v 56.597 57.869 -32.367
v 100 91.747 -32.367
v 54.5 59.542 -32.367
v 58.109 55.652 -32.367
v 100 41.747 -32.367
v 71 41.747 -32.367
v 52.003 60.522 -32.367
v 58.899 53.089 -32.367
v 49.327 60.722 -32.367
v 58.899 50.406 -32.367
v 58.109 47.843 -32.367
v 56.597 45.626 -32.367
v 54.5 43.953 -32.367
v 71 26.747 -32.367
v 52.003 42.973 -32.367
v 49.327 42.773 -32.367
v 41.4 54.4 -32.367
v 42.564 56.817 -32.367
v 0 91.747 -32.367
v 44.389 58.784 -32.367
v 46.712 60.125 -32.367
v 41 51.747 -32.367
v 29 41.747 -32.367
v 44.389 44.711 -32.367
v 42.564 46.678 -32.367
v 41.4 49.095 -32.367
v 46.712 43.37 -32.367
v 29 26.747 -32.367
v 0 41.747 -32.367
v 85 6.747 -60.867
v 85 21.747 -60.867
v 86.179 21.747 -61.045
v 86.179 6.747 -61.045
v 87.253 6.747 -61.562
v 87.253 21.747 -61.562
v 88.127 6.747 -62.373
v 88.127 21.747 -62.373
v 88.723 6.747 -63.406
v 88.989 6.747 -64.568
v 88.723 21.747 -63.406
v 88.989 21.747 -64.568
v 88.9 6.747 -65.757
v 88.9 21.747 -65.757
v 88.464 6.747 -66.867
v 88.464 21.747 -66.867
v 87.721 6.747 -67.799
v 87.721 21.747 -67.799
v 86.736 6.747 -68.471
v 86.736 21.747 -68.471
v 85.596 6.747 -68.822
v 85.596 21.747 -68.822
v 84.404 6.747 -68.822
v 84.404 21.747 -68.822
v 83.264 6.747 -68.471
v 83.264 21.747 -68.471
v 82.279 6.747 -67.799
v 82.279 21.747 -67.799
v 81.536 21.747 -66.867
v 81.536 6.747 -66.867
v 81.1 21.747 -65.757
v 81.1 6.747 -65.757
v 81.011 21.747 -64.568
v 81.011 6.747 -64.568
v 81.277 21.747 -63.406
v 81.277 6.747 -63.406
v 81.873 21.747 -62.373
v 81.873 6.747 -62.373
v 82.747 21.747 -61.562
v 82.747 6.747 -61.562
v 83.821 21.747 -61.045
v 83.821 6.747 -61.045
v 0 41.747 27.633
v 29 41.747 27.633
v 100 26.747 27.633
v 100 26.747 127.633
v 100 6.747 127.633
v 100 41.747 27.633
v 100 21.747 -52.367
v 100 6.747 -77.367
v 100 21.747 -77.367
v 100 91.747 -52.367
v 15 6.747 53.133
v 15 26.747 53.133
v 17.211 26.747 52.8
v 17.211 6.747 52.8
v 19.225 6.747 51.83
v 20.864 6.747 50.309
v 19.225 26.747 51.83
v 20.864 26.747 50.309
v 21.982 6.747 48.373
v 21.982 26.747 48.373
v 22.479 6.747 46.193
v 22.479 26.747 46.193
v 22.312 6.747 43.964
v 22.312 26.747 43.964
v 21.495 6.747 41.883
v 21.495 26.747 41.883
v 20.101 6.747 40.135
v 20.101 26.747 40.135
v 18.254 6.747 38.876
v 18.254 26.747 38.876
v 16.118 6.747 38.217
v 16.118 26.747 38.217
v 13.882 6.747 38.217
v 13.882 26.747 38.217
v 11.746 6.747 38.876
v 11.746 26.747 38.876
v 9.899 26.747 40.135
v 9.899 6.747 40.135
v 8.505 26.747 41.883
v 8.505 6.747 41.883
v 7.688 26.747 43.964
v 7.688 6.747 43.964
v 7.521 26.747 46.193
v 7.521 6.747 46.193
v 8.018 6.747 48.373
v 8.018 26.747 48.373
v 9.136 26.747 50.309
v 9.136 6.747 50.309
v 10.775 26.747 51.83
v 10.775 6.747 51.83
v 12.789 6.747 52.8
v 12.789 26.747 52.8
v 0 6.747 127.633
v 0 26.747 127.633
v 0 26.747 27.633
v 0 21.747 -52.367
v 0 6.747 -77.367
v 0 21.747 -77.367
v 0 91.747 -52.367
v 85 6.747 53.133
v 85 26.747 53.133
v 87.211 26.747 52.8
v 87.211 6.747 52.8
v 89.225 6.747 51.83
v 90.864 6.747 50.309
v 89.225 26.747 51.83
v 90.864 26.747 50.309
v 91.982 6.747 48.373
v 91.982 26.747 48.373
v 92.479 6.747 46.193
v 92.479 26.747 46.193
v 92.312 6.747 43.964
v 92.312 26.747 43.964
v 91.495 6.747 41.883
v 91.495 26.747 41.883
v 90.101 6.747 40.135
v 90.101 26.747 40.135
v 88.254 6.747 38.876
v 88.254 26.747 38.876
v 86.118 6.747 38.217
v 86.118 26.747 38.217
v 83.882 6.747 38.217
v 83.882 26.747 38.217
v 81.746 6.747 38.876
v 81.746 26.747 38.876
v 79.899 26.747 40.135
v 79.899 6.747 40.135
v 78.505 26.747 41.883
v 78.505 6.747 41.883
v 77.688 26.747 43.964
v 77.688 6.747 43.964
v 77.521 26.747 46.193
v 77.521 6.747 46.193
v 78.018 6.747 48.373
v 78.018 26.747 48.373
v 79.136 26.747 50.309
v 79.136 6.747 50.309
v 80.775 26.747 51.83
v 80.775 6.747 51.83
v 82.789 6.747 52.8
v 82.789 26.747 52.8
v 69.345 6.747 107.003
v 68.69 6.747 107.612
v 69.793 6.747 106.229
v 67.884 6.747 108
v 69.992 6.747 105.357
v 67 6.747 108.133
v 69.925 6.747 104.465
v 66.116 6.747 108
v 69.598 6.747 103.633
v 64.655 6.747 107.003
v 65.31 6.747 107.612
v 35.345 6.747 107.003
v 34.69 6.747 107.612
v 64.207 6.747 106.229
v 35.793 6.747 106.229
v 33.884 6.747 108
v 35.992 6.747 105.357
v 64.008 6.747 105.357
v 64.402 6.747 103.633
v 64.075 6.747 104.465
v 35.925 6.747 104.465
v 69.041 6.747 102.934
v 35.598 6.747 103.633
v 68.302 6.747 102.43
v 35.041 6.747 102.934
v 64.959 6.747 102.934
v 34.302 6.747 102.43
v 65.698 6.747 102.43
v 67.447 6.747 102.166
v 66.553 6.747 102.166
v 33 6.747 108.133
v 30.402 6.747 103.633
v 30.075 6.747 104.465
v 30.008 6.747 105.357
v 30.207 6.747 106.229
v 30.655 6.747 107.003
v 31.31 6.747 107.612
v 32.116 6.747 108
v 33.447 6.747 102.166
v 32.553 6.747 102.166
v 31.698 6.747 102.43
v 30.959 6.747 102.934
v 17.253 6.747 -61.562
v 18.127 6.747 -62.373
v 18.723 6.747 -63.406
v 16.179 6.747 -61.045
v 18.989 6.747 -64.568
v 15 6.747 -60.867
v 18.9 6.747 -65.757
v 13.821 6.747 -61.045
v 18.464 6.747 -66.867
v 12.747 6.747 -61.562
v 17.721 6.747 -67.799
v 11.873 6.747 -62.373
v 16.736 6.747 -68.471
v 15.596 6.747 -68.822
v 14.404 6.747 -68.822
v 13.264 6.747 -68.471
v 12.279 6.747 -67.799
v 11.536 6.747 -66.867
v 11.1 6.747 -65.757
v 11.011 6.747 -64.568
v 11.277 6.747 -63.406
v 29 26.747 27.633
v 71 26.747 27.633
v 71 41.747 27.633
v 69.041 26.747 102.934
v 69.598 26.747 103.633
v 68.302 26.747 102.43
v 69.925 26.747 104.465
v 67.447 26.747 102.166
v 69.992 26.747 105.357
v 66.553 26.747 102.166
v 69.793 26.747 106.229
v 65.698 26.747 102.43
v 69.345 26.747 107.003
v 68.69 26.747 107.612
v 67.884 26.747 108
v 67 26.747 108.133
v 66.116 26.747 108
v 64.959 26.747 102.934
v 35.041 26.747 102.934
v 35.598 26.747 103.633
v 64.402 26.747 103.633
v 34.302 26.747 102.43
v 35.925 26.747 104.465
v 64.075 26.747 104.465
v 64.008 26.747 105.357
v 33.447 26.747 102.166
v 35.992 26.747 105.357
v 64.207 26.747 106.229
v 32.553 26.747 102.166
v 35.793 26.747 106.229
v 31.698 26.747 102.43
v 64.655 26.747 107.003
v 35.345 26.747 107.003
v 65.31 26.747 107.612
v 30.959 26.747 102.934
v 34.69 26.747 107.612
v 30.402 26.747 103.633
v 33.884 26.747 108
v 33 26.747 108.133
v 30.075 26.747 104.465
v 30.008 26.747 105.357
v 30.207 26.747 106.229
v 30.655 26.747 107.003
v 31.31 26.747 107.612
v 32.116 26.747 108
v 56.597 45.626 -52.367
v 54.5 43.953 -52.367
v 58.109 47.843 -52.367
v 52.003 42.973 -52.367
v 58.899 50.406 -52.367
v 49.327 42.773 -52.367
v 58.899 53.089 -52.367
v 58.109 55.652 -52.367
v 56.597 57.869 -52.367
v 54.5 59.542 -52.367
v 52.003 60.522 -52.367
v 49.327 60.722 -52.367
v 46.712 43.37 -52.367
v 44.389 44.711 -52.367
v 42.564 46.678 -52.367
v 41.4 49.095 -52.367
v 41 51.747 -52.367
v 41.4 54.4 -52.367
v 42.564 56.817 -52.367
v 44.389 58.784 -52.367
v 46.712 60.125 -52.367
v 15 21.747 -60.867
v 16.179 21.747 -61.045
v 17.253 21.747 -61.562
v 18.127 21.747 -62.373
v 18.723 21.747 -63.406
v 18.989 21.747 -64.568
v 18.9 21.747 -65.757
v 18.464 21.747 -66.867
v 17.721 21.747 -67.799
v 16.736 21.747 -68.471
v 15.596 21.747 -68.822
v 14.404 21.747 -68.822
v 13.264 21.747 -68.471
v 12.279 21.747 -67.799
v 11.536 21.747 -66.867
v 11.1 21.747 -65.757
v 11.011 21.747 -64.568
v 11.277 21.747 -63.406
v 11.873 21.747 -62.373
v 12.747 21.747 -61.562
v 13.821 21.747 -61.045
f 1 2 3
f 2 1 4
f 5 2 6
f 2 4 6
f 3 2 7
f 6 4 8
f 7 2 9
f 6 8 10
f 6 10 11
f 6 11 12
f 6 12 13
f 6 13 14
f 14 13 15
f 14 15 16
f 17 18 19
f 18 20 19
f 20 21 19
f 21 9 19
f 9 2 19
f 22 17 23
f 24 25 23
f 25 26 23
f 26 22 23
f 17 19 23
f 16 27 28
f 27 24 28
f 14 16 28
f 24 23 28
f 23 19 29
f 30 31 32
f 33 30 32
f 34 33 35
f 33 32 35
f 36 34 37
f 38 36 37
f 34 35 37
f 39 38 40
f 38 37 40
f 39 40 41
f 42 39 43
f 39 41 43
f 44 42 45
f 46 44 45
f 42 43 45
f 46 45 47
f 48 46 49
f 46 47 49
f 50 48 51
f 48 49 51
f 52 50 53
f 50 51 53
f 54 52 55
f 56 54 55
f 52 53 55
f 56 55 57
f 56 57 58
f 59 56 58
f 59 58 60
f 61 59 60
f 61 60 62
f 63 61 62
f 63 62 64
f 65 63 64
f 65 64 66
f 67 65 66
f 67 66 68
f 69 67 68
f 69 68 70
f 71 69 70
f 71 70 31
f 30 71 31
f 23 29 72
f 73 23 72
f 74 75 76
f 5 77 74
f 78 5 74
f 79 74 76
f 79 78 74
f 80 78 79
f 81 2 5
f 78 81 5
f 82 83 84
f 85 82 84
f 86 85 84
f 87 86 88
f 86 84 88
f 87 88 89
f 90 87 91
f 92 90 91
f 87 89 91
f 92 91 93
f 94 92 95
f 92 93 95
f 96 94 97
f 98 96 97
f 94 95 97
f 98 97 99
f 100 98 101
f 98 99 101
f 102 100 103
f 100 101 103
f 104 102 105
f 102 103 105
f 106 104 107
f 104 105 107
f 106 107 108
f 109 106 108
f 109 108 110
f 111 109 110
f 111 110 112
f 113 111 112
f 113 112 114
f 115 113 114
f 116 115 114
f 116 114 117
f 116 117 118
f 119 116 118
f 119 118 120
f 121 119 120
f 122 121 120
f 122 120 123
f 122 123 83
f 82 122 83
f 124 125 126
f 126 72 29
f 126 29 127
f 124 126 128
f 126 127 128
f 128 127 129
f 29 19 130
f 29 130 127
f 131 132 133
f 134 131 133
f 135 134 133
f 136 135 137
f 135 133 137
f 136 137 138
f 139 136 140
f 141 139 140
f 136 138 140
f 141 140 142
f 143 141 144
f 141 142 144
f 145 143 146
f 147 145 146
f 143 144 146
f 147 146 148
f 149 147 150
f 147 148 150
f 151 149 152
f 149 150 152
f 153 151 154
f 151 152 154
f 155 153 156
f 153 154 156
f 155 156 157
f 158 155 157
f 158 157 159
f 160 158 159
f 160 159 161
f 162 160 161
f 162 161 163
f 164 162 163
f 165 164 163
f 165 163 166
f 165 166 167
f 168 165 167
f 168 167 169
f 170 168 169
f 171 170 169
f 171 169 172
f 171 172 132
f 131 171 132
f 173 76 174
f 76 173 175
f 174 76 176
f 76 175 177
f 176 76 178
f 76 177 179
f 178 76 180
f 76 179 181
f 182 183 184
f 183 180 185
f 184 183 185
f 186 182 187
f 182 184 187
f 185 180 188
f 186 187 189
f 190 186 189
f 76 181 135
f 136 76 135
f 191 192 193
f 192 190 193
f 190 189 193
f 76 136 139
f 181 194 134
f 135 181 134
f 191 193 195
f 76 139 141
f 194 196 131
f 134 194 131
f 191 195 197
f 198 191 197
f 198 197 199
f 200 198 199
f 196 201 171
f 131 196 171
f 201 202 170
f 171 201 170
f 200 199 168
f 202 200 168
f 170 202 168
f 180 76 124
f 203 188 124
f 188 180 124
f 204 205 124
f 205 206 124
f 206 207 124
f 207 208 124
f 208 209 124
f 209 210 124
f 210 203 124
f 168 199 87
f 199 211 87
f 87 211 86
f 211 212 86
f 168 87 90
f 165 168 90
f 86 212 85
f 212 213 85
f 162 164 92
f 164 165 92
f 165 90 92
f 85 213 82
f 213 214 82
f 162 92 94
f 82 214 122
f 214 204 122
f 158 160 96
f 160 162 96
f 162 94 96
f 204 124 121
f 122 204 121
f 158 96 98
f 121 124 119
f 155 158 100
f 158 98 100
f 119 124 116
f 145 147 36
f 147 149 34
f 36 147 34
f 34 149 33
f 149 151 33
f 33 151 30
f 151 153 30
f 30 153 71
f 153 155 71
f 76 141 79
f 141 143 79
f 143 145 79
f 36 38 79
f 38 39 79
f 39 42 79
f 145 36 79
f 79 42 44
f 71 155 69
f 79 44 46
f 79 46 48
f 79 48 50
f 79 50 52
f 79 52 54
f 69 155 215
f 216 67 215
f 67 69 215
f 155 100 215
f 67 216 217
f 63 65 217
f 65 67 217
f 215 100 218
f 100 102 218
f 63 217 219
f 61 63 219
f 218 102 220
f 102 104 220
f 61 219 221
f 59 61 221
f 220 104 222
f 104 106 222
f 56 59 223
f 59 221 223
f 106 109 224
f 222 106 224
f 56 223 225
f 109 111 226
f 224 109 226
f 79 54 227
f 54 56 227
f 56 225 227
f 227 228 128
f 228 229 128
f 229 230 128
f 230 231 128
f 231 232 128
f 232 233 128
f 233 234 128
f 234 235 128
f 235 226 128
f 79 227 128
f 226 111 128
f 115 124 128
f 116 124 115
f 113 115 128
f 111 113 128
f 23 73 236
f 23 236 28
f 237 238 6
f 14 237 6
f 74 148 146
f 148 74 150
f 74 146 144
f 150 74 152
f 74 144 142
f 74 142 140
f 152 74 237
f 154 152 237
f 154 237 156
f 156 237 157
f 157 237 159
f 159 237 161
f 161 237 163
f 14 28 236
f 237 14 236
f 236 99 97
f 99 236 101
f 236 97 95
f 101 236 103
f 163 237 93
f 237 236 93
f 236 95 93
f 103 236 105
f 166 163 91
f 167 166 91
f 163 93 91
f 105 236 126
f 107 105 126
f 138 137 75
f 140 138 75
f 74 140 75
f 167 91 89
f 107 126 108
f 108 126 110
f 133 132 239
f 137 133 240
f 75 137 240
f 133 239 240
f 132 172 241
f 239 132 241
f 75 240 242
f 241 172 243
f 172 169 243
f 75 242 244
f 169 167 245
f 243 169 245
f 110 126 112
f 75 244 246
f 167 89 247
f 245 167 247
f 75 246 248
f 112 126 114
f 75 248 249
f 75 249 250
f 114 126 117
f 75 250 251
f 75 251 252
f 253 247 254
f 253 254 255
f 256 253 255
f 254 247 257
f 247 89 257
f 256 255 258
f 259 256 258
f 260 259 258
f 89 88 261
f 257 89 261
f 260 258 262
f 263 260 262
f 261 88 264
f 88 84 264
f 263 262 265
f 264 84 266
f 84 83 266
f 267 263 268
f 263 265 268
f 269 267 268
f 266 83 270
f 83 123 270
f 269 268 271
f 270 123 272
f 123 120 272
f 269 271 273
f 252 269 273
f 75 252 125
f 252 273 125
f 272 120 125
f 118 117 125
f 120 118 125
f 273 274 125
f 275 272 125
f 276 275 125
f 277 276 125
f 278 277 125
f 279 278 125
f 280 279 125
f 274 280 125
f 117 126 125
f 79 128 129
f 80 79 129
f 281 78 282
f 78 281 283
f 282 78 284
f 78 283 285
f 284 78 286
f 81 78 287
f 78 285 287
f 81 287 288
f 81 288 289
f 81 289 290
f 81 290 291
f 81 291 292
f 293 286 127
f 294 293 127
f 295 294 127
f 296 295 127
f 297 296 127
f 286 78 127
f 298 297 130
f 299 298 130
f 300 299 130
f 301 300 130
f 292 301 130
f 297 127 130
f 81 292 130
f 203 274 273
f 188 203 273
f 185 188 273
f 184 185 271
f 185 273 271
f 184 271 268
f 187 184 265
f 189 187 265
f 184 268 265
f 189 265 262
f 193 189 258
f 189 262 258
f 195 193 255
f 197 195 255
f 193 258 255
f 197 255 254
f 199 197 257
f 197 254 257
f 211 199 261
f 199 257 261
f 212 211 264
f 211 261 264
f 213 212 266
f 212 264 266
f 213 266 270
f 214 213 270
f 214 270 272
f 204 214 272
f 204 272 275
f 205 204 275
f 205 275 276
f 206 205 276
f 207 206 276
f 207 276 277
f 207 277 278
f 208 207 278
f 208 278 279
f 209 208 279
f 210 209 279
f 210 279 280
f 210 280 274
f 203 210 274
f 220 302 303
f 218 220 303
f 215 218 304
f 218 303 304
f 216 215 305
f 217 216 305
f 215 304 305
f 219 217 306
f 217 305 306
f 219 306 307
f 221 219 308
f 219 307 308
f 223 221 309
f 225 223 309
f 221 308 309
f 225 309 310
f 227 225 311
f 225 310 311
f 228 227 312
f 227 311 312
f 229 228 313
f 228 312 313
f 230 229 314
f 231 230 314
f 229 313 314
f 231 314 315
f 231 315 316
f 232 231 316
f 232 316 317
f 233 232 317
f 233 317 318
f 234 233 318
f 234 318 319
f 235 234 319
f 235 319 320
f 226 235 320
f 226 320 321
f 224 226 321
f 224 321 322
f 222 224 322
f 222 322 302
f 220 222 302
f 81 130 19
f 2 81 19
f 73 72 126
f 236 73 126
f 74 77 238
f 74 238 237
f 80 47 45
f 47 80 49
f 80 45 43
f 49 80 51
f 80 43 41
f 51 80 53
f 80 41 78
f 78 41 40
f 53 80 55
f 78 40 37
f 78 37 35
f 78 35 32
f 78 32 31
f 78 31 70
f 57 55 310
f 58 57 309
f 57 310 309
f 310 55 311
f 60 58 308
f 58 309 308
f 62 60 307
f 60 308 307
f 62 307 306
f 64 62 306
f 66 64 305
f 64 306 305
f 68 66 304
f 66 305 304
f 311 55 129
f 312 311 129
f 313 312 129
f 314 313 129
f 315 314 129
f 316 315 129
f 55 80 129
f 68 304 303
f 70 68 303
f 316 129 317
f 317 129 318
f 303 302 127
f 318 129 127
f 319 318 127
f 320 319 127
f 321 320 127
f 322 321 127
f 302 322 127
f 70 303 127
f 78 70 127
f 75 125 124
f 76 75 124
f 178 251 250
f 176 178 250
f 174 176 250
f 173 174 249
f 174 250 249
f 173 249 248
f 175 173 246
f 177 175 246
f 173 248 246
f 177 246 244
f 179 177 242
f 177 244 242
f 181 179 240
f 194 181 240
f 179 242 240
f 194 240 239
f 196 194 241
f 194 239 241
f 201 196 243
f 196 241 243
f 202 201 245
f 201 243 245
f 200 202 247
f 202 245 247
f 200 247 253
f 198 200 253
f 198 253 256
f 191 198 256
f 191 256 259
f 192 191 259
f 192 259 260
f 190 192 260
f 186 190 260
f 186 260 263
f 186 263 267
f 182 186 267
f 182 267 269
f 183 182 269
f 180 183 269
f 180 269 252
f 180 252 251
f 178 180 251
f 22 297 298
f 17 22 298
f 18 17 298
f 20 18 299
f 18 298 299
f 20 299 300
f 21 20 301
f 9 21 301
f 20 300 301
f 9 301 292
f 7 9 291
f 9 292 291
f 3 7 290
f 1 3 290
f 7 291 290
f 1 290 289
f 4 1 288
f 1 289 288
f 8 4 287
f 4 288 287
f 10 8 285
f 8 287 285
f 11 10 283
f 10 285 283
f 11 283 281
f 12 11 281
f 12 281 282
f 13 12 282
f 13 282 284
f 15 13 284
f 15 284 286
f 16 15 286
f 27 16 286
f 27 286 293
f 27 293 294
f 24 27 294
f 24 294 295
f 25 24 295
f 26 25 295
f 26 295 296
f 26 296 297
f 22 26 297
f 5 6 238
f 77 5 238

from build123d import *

# Parameters (mm, degrees)
Y_KSEKLIK_EKSTR_ZYON1_DEPTH = 100
IZIM2_W                     = 42
IZIM2_H                     = 60
KES_EKSTR_ZYON1_DEPTH       = 15
IZIM3_R                     = 4
IZIM3_R_2                   = 3
KES_EKSTR_ZYON2_DEPTH       = 175.685863047
IZIM4_R                     = 7.5
KES_EKSTR_ZYON5_DEPTH       = 175.685863047
IZIM5_R                     = 9
KES_EKSTR_ZYON6_DEPTH       = 226.427594277


with BuildPart() as part:
    # Çizim1 → Yükseklik-Ekstrüzyon1 (new body)
    with BuildSketch(Plane(origin=(0, 0, 0), x_dir=(0, 0, -1), z_dir=(1, 0, 0))):
        Polygon((-127.632874873, 26.747480954), (-127.632874873, 6.747480954), (77.367125127, 6.747480954), (77.367125127, 21.747480954), (52.367125127, 21.747480954), (52.367125127, 91.747480954), (32.367125127, 91.747480954), (32.367125127, 41.747480954), (-27.632874873, 41.747480954), (-27.632874873, 26.747480954), align=None)
    extrude(amount=Y_KSEKLIK_EKSTR_ZYON1_DEPTH)

    # Çizim2 → Kes-Ekstrüzyon1 (cut)
    with BuildSketch(Plane(origin=(0, 41.747480954, 0), x_dir=(1, 0, 0), z_dir=(0, 1, 0))):
        with Locations((50, 2.367125127)):
            Rectangle(IZIM2_W, IZIM2_H)
    extrude(amount=-KES_EKSTR_ZYON1_DEPTH, mode=Mode.SUBTRACT)

    # Çizim3 → Kes-Ekstrüzyon2 (cut, through all)
    with BuildSketch(Plane(origin=(0, 26.747480954, 0), x_dir=(1, 0, 0), z_dir=(0, 1, 0))):
        with Locations(Location((15, 64.867125127, 0), (0, 0, 270))):
            Circle(IZIM3_R)
        with Locations(Location((85, 64.867125127, 0), (0, 0, 270))):
            Circle(IZIM3_R)
        with Locations(Location((33, -105.132874873, 0), (0, 0, 270))):
            Circle(IZIM3_R_2)
        with Locations(Location((67, -105.132874873, 0), (0, 0, 270))):
            Circle(IZIM3_R_2)
    extrude(amount=-KES_EKSTR_ZYON2_DEPTH, mode=Mode.SUBTRACT)

    # Çizim4 → Kes-Ekstrüzyon5 (cut, through all)
    with BuildSketch(Plane(origin=(0, 26.747480954, 0), x_dir=(1, 0, 0), z_dir=(0, 1, 0))):
        with Locations(Location((15, -45.632874873, 0), (0, 0, 270))):
            Circle(IZIM4_R)
        with Locations(Location((85, -45.632874873, 0), (0, 0, 270))):
            Circle(IZIM4_R)
    extrude(amount=-KES_EKSTR_ZYON5_DEPTH, mode=Mode.SUBTRACT)

    # Çizim5 → Kes-Ekstrüzyon6 (cut, through all)
    with BuildSketch(Plane(origin=(0, 0, -52.367125127), x_dir=(-1, 0, 0), z_dir=(0, 0, -1))):
        with Locations((-50, 51.747480954)):
            Circle(IZIM5_R)
    extrude(amount=-KES_EKSTR_ZYON6_DEPTH, mode=Mode.SUBTRACT)


solid = part.part
